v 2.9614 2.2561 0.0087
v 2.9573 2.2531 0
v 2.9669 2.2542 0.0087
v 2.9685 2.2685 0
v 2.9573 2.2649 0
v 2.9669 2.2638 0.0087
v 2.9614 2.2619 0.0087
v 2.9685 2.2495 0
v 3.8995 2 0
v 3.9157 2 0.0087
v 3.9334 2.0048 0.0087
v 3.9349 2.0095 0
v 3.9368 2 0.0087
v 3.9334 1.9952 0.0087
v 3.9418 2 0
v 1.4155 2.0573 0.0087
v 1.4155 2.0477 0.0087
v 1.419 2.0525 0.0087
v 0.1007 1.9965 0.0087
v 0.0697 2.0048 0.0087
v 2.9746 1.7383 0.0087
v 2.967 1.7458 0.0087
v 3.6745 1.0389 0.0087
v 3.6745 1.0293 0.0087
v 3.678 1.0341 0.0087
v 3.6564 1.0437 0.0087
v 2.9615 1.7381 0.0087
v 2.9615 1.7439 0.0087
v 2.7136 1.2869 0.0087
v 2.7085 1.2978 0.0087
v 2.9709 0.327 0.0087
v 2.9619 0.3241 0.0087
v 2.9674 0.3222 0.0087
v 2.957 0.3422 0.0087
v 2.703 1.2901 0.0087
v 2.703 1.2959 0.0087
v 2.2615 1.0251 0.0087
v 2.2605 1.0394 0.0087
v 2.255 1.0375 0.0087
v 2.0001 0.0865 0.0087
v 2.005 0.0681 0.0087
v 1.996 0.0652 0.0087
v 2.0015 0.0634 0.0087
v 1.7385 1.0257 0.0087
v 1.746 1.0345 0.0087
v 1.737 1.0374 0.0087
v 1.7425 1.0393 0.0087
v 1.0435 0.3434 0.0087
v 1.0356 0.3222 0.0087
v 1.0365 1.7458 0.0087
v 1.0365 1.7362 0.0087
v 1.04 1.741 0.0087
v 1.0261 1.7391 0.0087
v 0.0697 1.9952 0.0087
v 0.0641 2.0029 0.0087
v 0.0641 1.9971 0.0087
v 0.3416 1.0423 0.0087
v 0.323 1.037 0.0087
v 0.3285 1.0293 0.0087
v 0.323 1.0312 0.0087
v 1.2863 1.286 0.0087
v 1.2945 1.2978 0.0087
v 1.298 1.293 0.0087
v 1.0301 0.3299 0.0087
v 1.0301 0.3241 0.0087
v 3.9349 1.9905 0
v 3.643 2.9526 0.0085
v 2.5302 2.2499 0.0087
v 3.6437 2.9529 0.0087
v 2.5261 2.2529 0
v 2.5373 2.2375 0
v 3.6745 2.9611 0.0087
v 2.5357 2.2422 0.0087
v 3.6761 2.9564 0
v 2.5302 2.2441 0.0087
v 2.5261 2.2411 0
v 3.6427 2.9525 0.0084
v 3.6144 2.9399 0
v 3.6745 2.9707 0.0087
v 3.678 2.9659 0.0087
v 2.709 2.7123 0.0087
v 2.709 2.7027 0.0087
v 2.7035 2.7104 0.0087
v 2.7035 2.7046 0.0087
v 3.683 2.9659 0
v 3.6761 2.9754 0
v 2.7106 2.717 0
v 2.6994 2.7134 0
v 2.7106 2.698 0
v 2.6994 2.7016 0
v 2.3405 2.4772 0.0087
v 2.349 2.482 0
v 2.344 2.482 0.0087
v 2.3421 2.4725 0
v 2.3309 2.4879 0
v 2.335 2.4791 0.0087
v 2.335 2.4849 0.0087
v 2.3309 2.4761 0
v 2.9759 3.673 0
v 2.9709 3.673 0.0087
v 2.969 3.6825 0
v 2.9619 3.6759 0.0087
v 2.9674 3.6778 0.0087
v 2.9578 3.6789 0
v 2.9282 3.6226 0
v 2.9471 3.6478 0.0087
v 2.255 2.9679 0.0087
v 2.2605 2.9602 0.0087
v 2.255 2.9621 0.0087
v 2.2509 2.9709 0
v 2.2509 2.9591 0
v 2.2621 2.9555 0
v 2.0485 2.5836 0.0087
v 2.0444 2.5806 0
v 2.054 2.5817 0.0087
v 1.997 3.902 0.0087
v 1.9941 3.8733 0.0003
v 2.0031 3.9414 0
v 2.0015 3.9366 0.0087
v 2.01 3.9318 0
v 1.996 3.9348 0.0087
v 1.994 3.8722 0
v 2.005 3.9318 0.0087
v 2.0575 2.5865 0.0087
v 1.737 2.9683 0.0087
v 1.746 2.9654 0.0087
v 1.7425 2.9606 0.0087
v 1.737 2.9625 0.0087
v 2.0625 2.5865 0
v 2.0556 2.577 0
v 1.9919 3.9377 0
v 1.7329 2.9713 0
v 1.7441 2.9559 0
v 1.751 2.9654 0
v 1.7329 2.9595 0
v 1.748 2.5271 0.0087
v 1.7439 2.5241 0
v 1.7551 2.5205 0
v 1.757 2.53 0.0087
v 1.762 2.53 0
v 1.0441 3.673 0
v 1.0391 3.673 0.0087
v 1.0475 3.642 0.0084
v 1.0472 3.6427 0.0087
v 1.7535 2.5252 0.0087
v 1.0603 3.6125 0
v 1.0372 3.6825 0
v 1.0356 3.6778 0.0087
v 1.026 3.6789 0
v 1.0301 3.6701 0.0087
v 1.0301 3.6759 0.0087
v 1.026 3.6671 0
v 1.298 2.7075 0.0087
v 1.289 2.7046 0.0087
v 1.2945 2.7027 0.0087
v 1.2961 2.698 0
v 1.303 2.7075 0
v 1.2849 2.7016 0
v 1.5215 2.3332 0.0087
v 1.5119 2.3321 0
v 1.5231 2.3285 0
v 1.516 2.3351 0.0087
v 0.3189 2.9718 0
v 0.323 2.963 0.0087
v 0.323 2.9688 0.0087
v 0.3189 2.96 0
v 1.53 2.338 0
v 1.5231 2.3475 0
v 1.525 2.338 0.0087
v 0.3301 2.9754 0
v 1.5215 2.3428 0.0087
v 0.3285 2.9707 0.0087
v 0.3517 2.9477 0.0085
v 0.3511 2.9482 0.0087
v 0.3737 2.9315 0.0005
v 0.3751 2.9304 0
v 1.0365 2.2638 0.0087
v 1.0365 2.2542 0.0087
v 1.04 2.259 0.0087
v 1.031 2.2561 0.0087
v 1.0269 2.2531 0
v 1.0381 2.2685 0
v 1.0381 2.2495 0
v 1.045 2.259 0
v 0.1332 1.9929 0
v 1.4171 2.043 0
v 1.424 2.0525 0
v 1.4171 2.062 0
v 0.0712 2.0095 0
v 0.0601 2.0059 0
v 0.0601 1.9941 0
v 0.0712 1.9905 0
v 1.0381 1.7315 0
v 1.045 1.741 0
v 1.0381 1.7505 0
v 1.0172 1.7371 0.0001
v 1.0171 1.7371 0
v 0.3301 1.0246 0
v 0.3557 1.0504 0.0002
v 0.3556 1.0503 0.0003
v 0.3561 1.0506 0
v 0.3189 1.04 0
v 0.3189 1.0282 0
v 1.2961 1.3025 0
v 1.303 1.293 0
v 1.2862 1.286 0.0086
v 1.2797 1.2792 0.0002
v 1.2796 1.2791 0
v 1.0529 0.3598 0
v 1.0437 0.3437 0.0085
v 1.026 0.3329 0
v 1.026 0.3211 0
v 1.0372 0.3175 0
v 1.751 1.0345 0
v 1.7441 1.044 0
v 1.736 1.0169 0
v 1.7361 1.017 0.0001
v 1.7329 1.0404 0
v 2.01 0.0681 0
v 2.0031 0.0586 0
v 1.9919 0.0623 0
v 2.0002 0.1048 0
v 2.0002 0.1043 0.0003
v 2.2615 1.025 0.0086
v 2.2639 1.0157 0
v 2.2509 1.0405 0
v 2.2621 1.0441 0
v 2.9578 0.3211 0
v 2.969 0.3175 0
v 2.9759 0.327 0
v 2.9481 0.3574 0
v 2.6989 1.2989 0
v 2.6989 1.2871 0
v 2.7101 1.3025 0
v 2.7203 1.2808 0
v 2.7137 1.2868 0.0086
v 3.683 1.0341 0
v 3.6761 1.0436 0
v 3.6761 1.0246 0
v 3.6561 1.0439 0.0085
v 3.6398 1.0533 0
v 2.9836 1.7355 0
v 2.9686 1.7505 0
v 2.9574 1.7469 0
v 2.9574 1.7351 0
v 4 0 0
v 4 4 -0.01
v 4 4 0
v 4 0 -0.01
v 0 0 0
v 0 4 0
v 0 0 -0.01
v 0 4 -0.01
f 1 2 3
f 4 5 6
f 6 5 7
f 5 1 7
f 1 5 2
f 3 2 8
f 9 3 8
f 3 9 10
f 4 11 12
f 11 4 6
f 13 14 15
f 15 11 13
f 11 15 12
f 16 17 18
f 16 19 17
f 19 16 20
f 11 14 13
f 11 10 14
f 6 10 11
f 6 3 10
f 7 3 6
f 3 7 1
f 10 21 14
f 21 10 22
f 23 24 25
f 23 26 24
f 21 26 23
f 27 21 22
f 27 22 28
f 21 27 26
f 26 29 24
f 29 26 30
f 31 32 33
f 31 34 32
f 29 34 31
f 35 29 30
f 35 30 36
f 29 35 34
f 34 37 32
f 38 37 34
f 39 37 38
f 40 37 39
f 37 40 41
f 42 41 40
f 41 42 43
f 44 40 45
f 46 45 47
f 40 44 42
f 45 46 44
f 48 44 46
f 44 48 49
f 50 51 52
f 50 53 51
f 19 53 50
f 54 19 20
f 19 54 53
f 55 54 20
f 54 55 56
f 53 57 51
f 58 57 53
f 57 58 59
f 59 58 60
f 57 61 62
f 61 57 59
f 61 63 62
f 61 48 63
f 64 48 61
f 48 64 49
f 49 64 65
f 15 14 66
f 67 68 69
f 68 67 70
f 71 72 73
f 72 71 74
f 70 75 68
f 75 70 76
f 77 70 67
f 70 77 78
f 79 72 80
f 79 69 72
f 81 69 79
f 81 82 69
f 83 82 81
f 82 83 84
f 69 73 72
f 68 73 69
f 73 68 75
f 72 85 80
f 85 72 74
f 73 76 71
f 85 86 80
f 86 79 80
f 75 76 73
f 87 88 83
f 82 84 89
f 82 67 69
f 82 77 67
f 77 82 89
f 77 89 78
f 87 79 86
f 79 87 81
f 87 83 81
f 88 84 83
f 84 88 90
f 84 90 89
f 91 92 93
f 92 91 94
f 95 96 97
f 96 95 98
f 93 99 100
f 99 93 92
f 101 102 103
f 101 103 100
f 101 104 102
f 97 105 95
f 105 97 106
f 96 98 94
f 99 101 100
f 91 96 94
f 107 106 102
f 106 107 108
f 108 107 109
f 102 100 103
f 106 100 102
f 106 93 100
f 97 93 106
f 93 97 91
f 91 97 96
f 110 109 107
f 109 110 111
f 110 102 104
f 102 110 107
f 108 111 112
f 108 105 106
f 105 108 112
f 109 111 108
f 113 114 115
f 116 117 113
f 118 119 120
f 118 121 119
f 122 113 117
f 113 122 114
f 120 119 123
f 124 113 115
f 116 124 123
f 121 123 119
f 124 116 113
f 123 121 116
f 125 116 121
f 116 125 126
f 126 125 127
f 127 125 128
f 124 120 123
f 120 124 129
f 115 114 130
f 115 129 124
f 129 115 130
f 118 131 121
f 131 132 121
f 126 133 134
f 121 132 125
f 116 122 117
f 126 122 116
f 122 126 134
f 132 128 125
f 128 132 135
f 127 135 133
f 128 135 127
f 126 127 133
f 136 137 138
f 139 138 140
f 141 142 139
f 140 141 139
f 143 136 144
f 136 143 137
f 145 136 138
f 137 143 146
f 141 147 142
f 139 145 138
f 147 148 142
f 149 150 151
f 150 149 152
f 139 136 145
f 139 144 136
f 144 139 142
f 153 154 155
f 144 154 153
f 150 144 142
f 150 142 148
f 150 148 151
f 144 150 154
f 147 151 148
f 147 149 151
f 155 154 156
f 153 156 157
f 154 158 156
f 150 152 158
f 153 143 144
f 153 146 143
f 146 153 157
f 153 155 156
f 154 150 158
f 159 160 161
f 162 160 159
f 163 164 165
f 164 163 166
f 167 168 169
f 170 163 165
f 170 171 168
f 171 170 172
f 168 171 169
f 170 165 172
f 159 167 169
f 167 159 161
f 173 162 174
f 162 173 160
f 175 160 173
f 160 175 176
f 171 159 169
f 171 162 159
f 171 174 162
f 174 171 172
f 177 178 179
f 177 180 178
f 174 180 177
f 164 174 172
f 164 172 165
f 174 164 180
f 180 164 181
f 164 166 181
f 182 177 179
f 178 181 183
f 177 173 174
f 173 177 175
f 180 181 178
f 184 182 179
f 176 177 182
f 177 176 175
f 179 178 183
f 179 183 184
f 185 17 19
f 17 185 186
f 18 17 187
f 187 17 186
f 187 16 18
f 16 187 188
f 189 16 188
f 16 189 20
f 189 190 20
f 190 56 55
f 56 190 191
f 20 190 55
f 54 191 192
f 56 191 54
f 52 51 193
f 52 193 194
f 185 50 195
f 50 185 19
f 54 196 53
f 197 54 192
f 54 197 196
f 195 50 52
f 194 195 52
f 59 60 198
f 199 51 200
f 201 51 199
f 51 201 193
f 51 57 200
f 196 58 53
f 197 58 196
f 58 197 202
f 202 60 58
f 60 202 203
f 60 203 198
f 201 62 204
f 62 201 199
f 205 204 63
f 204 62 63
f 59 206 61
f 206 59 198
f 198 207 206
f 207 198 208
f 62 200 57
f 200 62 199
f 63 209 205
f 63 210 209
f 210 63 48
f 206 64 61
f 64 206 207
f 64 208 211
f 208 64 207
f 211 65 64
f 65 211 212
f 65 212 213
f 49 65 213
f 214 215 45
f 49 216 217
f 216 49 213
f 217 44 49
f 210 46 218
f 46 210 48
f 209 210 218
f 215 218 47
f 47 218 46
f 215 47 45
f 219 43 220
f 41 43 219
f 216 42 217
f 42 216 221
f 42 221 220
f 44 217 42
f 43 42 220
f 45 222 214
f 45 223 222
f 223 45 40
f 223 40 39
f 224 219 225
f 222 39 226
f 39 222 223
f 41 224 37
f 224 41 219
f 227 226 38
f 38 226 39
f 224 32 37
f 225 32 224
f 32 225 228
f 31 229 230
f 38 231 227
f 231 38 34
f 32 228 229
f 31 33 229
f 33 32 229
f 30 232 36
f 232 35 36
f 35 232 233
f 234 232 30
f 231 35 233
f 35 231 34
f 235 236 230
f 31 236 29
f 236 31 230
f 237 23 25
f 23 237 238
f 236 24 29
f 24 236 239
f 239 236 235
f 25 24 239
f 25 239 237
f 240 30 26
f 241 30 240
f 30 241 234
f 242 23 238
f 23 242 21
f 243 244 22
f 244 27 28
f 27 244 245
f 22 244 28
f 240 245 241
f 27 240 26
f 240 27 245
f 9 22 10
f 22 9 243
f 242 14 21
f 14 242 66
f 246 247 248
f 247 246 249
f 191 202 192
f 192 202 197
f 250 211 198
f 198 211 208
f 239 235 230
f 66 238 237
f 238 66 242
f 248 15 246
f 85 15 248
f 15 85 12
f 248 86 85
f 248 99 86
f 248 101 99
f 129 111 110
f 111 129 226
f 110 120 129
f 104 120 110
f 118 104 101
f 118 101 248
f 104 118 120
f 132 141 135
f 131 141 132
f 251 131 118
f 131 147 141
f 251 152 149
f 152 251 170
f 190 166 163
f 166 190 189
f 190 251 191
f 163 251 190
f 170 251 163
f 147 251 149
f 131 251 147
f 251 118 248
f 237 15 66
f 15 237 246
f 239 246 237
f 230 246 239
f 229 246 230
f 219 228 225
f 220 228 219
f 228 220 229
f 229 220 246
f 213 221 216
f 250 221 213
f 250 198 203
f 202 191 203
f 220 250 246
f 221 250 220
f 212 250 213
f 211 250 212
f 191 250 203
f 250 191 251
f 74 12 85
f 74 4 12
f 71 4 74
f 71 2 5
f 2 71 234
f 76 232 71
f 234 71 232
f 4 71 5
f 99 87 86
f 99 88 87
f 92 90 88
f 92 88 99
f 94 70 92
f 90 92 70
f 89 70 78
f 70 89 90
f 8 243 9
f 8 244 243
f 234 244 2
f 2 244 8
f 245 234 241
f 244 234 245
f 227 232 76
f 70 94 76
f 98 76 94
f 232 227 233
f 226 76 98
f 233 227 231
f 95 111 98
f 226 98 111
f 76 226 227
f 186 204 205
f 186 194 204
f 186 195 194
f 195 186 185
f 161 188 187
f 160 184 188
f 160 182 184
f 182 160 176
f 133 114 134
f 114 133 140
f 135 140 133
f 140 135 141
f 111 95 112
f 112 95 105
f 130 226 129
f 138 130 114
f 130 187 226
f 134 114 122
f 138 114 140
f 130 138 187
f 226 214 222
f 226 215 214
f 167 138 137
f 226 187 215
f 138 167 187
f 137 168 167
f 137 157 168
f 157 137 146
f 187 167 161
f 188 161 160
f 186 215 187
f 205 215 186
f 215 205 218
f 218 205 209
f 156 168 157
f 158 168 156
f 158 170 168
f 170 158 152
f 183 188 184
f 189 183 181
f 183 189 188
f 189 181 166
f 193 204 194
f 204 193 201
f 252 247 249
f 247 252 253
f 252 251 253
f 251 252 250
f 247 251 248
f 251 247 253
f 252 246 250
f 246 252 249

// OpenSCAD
hull(){
    translate([3.93185, 2.0]) sphere(0.01);
    translate([2.9654, 2.259]) sphere(0.01);
}
hull(){
    translate([2.5342, 2.247]) sphere(0.01);
    translate([3.673, 2.9659]) sphere(0.01);
}
hull(){
    translate([3.673, 2.9659]) sphere(0.01);
    translate([2.7075, 2.7075]) sphere(0.01);
}
hull(){
    translate([2.339, 2.482]) sphere(0.01);
    translate([2.9659, 3.673]) sphere(0.01);
}
hull(){
    translate([2.9659, 3.673]) sphere(0.01);
    translate([2.259, 2.965]) sphere(0.01);
}
hull(){
    translate([2.0525, 2.5865]) sphere(0.01);
    translate([2.0, 3.93185]) sphere(0.01);
}
hull(){
    translate([2.0, 3.93185]) sphere(0.01);
    translate([1.741, 2.9654]) sphere(0.01);
}
hull(){
    translate([1.752, 2.53]) sphere(0.01);
    translate([1.0341, 3.673]) sphere(0.01);
}
hull(){
    translate([1.0341, 3.673]) sphere(0.01);
    translate([1.293, 2.7075]) sphere(0.01);
}
hull(){
    translate([1.52, 2.338]) sphere(0.01);
    translate([0.327, 2.9659]) sphere(0.01);
}
hull(){
    translate([0.327, 2.9659]) sphere(0.01);
    translate([1.035, 2.259]) sphere(0.01);
}
hull(){
    translate([1.414, 2.0525]) sphere(0.01);
    translate([0.06815, 2.0]) sphere(0.01);
}
hull(){
    translate([0.06815, 2.0]) sphere(0.01);
    translate([1.035, 1.741]) sphere(0.01);
}
hull(){
    translate([1.035, 1.741]) sphere(0.01);
    translate([0.327, 1.0341]) sphere(0.01);
}
hull(){
    translate([0.327, 1.0341]) sphere(0.01);
    translate([1.293, 1.293]) sphere(0.01);
}
hull(){
    translate([1.293, 1.293]) sphere(0.01);
    translate([1.0341, 0.327]) sphere(0.01);
}
hull(){
    translate([1.0341, 0.327]) sphere(0.01);
    translate([1.741, 1.0345]) sphere(0.01);
}
hull(){
    translate([1.741, 1.0345]) sphere(0.01);
    translate([2.0, 0.06815]) sphere(0.01);
}
hull(){
    translate([2.0, 0.06815]) sphere(0.01);
    translate([2.259, 1.0346]) sphere(0.01);
}
hull(){
    translate([2.259, 1.0346]) sphere(0.01);
    translate([2.9659, 0.327]) sphere(0.01);
}
hull(){
    translate([2.9659, 0.327]) sphere(0.01);
    translate([2.707, 1.293]) sphere(0.01);
}
hull(){
    translate([2.707, 1.293]) sphere(0.01);
    translate([3.673, 1.0341]) sphere(0.01);
}
hull(){
    translate([3.673, 1.0341]) sphere(0.01);
    translate([2.9655, 1.741]) sphere(0.01);
}
hull(){
    translate([2.9655, 1.741]) sphere(0.01);
    translate([3.93185, 2.0]) sphere(0.01);
}
translate([0,0,-0.01]) color([0.1,0.1,0.1]) cube([4,4,0.01]);
